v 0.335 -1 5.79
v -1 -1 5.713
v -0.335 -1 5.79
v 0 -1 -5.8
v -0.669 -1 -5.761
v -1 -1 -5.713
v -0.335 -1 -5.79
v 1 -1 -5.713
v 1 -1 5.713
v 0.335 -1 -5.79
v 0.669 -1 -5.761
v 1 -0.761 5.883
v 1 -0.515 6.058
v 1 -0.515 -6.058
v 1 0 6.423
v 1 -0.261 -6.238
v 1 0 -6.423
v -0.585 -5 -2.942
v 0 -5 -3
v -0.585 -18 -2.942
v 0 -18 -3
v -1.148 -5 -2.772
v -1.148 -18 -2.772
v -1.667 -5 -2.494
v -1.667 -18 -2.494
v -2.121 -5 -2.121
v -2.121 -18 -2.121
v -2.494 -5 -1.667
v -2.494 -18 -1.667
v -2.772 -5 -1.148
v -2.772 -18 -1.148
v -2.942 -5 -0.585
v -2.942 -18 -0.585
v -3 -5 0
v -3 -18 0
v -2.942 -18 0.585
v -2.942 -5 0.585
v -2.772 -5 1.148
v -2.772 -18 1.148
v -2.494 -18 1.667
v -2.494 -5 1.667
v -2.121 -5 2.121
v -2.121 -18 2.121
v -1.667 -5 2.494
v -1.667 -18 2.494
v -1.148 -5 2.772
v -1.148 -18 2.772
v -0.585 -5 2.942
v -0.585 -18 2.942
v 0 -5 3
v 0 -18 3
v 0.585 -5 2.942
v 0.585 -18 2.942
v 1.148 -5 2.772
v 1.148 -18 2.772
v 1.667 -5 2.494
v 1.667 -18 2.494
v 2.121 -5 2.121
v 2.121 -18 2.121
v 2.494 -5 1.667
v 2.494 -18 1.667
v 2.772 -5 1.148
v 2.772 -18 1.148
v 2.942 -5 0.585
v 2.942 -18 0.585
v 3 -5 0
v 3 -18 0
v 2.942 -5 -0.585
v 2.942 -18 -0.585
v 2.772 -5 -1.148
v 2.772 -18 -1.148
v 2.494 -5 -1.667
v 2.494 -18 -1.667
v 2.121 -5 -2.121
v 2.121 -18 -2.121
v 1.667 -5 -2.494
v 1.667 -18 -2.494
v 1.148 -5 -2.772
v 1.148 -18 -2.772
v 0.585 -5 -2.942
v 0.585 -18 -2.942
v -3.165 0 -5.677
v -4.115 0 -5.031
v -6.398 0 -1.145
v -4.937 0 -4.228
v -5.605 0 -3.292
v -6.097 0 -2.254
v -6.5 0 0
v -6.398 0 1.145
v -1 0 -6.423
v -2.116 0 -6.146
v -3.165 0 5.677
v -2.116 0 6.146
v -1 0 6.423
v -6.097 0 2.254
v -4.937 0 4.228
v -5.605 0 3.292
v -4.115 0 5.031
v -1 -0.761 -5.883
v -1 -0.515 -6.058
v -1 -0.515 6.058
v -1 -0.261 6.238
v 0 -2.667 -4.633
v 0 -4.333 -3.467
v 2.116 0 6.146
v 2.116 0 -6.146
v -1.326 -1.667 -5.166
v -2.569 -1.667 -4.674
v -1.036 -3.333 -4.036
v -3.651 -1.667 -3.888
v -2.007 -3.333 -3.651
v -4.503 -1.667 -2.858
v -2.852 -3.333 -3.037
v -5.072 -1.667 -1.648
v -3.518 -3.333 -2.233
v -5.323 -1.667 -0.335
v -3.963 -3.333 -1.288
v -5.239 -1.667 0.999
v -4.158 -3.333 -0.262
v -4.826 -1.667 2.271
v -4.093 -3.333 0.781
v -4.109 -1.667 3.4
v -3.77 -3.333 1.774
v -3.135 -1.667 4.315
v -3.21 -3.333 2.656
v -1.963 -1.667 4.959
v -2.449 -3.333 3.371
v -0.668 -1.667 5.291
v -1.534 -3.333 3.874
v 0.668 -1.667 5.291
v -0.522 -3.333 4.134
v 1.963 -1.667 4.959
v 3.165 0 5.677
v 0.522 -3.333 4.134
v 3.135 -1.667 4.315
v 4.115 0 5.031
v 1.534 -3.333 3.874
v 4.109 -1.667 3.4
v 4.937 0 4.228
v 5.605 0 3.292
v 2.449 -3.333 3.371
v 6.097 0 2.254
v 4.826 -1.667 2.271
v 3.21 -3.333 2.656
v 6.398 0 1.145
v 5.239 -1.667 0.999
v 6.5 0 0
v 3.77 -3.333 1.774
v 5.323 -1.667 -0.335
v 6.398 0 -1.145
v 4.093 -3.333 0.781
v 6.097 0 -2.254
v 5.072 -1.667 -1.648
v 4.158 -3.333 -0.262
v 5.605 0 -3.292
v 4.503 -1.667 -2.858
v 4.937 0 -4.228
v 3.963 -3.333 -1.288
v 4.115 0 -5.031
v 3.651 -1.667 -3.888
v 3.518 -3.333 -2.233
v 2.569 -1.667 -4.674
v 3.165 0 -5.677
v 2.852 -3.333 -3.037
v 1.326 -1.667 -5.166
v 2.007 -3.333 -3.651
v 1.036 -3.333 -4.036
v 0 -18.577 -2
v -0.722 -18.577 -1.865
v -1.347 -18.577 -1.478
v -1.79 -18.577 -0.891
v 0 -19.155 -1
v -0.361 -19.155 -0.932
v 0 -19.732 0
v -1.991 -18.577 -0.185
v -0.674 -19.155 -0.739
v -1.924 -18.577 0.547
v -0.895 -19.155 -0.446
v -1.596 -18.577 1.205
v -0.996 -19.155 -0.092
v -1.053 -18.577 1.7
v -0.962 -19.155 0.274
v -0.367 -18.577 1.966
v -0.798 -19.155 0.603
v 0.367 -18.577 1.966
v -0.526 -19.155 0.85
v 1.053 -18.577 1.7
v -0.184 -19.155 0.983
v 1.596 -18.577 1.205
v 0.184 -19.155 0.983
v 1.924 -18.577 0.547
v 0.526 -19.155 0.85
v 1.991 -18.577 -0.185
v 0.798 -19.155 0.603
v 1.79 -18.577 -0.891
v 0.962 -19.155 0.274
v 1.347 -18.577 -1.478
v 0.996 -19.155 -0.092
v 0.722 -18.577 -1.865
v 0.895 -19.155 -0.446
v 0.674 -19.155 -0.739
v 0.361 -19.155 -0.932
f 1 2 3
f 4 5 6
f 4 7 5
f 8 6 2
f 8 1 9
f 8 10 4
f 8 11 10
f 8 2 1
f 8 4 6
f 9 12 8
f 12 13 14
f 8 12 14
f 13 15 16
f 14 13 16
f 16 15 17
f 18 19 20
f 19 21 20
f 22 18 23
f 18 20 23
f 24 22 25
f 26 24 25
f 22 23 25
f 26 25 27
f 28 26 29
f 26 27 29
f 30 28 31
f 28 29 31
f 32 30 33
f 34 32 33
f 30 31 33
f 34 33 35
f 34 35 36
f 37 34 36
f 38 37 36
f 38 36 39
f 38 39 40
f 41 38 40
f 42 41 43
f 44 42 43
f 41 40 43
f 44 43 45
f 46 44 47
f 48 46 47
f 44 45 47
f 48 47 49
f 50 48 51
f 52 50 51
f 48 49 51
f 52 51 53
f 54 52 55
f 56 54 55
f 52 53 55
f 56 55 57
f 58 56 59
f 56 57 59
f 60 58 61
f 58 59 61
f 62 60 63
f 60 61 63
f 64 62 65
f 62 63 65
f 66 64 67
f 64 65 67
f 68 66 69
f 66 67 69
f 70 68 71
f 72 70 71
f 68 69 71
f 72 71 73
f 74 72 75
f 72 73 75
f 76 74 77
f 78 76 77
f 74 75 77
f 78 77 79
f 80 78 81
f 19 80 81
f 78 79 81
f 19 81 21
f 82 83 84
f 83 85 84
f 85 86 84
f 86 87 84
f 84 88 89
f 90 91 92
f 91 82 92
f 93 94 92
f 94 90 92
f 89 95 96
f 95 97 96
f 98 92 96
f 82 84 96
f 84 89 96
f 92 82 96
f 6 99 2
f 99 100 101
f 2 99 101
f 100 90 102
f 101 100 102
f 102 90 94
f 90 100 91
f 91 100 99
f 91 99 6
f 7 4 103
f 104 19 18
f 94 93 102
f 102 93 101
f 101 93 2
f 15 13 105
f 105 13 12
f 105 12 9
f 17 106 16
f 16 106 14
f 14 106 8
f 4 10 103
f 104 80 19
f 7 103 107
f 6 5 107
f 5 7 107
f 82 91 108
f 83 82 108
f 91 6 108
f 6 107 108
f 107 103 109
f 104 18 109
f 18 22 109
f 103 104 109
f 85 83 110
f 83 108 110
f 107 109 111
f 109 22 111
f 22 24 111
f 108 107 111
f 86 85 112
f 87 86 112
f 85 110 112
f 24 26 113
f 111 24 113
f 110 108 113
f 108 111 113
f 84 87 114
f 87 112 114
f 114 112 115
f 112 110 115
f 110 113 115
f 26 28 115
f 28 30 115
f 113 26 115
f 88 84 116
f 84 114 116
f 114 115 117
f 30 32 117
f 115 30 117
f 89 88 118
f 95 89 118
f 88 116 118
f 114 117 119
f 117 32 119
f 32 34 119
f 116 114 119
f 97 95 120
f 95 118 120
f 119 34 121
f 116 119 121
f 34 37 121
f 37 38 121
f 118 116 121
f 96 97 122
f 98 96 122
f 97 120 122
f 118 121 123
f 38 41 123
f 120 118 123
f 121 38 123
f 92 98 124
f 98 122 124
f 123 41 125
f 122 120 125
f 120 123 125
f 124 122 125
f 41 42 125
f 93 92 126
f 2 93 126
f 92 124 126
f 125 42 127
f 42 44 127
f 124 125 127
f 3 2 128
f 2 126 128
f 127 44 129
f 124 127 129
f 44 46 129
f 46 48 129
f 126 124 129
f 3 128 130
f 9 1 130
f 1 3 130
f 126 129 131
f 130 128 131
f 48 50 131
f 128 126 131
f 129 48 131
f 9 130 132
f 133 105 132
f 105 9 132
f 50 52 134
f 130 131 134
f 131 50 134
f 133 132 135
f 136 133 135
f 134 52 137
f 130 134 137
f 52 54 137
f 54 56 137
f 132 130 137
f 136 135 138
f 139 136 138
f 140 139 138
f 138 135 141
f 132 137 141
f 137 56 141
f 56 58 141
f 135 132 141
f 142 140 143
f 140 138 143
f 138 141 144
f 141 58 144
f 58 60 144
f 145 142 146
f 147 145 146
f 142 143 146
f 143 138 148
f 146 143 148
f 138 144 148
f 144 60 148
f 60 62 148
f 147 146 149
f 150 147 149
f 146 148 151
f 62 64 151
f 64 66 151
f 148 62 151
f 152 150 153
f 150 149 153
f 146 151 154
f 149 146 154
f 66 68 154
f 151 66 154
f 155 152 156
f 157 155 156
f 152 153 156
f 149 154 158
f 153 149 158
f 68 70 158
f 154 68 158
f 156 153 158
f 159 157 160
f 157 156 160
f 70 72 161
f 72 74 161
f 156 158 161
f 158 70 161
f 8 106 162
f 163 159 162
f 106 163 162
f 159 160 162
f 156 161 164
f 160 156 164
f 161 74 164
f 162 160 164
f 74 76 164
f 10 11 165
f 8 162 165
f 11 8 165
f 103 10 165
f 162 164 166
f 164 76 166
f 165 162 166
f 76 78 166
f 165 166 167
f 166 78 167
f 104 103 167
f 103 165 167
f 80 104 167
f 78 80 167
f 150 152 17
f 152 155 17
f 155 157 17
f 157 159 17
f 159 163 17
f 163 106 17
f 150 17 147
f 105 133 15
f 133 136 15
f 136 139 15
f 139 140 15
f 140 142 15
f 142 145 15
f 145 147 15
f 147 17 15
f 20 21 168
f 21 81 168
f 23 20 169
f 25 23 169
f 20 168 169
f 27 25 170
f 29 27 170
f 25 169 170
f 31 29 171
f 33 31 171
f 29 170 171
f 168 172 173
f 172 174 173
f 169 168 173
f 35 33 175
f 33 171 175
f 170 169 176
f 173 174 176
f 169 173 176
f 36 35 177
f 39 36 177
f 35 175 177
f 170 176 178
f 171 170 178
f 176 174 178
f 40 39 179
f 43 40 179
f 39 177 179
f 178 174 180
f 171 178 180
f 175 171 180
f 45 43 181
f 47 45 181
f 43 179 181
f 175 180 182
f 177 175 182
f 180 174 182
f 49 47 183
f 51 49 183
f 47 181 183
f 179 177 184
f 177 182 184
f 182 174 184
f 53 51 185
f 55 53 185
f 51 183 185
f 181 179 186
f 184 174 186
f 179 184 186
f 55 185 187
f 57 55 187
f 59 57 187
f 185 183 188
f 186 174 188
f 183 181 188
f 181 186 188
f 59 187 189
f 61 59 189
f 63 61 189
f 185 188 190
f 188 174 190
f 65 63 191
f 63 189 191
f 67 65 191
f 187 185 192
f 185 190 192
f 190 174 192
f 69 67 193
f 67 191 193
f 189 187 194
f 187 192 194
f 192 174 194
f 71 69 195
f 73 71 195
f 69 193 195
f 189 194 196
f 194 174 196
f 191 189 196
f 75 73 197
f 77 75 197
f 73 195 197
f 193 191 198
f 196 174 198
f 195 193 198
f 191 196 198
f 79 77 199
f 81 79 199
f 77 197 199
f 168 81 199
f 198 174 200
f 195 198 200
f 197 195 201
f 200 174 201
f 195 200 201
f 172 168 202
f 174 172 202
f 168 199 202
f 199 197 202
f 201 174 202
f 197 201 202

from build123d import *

# Parameters (mm, degrees)
CUT_EXTRUDE1_DEPTH = 1


with BuildPart() as part:
    # Sketch1 → Revolve5 (revolve)
    with BuildSketch(Plane.XY, mode=Mode.PRIVATE) as revolve5_sk:
        Polygon((6.5, 0), (3, -5), (3, -18), (0, -19.732050808), (0, 0), align=None)
    revolve(revolve5_sk.sketch.rotate(Axis((0, 0, 0), (0, 1, 0)), 90), axis=Axis((0, 0, 0), (0, 1, 0)))

    # Sketch2 → Cut-Extrude1 (cut)
    with BuildSketch(Plane(origin=(0, 0, 0), x_dir=(1, 0, 0), z_dir=(0, 1, 0))):
        with BuildLine():
            Line((0, -6.5), (0, 6.5))
            ThreePointArc((0, 6.5), (-0.501494825, 6.480625197), (-1, 6.422616289))
            Line((-1, 6.422616289), (-1, -6.422616289))
            ThreePointArc((-1, -6.422616289), (-0.501494825, -6.480625197), (0, -6.5))
        make_face()
        with BuildLine():
            ThreePointArc((1, 6.422616289), (0.501494825, 6.480625197), (0, 6.5))
            Line((0, 6.5), (0, -6.5))
            ThreePointArc((0, -6.5), (0.501494825, -6.480625197), (1, -6.422616289))
            Line((1, -6.422616289), (1, 6.422616289))
        make_face()
    extrude(amount=-CUT_EXTRUDE1_DEPTH, mode=Mode.SUBTRACT)


solid = part.part
